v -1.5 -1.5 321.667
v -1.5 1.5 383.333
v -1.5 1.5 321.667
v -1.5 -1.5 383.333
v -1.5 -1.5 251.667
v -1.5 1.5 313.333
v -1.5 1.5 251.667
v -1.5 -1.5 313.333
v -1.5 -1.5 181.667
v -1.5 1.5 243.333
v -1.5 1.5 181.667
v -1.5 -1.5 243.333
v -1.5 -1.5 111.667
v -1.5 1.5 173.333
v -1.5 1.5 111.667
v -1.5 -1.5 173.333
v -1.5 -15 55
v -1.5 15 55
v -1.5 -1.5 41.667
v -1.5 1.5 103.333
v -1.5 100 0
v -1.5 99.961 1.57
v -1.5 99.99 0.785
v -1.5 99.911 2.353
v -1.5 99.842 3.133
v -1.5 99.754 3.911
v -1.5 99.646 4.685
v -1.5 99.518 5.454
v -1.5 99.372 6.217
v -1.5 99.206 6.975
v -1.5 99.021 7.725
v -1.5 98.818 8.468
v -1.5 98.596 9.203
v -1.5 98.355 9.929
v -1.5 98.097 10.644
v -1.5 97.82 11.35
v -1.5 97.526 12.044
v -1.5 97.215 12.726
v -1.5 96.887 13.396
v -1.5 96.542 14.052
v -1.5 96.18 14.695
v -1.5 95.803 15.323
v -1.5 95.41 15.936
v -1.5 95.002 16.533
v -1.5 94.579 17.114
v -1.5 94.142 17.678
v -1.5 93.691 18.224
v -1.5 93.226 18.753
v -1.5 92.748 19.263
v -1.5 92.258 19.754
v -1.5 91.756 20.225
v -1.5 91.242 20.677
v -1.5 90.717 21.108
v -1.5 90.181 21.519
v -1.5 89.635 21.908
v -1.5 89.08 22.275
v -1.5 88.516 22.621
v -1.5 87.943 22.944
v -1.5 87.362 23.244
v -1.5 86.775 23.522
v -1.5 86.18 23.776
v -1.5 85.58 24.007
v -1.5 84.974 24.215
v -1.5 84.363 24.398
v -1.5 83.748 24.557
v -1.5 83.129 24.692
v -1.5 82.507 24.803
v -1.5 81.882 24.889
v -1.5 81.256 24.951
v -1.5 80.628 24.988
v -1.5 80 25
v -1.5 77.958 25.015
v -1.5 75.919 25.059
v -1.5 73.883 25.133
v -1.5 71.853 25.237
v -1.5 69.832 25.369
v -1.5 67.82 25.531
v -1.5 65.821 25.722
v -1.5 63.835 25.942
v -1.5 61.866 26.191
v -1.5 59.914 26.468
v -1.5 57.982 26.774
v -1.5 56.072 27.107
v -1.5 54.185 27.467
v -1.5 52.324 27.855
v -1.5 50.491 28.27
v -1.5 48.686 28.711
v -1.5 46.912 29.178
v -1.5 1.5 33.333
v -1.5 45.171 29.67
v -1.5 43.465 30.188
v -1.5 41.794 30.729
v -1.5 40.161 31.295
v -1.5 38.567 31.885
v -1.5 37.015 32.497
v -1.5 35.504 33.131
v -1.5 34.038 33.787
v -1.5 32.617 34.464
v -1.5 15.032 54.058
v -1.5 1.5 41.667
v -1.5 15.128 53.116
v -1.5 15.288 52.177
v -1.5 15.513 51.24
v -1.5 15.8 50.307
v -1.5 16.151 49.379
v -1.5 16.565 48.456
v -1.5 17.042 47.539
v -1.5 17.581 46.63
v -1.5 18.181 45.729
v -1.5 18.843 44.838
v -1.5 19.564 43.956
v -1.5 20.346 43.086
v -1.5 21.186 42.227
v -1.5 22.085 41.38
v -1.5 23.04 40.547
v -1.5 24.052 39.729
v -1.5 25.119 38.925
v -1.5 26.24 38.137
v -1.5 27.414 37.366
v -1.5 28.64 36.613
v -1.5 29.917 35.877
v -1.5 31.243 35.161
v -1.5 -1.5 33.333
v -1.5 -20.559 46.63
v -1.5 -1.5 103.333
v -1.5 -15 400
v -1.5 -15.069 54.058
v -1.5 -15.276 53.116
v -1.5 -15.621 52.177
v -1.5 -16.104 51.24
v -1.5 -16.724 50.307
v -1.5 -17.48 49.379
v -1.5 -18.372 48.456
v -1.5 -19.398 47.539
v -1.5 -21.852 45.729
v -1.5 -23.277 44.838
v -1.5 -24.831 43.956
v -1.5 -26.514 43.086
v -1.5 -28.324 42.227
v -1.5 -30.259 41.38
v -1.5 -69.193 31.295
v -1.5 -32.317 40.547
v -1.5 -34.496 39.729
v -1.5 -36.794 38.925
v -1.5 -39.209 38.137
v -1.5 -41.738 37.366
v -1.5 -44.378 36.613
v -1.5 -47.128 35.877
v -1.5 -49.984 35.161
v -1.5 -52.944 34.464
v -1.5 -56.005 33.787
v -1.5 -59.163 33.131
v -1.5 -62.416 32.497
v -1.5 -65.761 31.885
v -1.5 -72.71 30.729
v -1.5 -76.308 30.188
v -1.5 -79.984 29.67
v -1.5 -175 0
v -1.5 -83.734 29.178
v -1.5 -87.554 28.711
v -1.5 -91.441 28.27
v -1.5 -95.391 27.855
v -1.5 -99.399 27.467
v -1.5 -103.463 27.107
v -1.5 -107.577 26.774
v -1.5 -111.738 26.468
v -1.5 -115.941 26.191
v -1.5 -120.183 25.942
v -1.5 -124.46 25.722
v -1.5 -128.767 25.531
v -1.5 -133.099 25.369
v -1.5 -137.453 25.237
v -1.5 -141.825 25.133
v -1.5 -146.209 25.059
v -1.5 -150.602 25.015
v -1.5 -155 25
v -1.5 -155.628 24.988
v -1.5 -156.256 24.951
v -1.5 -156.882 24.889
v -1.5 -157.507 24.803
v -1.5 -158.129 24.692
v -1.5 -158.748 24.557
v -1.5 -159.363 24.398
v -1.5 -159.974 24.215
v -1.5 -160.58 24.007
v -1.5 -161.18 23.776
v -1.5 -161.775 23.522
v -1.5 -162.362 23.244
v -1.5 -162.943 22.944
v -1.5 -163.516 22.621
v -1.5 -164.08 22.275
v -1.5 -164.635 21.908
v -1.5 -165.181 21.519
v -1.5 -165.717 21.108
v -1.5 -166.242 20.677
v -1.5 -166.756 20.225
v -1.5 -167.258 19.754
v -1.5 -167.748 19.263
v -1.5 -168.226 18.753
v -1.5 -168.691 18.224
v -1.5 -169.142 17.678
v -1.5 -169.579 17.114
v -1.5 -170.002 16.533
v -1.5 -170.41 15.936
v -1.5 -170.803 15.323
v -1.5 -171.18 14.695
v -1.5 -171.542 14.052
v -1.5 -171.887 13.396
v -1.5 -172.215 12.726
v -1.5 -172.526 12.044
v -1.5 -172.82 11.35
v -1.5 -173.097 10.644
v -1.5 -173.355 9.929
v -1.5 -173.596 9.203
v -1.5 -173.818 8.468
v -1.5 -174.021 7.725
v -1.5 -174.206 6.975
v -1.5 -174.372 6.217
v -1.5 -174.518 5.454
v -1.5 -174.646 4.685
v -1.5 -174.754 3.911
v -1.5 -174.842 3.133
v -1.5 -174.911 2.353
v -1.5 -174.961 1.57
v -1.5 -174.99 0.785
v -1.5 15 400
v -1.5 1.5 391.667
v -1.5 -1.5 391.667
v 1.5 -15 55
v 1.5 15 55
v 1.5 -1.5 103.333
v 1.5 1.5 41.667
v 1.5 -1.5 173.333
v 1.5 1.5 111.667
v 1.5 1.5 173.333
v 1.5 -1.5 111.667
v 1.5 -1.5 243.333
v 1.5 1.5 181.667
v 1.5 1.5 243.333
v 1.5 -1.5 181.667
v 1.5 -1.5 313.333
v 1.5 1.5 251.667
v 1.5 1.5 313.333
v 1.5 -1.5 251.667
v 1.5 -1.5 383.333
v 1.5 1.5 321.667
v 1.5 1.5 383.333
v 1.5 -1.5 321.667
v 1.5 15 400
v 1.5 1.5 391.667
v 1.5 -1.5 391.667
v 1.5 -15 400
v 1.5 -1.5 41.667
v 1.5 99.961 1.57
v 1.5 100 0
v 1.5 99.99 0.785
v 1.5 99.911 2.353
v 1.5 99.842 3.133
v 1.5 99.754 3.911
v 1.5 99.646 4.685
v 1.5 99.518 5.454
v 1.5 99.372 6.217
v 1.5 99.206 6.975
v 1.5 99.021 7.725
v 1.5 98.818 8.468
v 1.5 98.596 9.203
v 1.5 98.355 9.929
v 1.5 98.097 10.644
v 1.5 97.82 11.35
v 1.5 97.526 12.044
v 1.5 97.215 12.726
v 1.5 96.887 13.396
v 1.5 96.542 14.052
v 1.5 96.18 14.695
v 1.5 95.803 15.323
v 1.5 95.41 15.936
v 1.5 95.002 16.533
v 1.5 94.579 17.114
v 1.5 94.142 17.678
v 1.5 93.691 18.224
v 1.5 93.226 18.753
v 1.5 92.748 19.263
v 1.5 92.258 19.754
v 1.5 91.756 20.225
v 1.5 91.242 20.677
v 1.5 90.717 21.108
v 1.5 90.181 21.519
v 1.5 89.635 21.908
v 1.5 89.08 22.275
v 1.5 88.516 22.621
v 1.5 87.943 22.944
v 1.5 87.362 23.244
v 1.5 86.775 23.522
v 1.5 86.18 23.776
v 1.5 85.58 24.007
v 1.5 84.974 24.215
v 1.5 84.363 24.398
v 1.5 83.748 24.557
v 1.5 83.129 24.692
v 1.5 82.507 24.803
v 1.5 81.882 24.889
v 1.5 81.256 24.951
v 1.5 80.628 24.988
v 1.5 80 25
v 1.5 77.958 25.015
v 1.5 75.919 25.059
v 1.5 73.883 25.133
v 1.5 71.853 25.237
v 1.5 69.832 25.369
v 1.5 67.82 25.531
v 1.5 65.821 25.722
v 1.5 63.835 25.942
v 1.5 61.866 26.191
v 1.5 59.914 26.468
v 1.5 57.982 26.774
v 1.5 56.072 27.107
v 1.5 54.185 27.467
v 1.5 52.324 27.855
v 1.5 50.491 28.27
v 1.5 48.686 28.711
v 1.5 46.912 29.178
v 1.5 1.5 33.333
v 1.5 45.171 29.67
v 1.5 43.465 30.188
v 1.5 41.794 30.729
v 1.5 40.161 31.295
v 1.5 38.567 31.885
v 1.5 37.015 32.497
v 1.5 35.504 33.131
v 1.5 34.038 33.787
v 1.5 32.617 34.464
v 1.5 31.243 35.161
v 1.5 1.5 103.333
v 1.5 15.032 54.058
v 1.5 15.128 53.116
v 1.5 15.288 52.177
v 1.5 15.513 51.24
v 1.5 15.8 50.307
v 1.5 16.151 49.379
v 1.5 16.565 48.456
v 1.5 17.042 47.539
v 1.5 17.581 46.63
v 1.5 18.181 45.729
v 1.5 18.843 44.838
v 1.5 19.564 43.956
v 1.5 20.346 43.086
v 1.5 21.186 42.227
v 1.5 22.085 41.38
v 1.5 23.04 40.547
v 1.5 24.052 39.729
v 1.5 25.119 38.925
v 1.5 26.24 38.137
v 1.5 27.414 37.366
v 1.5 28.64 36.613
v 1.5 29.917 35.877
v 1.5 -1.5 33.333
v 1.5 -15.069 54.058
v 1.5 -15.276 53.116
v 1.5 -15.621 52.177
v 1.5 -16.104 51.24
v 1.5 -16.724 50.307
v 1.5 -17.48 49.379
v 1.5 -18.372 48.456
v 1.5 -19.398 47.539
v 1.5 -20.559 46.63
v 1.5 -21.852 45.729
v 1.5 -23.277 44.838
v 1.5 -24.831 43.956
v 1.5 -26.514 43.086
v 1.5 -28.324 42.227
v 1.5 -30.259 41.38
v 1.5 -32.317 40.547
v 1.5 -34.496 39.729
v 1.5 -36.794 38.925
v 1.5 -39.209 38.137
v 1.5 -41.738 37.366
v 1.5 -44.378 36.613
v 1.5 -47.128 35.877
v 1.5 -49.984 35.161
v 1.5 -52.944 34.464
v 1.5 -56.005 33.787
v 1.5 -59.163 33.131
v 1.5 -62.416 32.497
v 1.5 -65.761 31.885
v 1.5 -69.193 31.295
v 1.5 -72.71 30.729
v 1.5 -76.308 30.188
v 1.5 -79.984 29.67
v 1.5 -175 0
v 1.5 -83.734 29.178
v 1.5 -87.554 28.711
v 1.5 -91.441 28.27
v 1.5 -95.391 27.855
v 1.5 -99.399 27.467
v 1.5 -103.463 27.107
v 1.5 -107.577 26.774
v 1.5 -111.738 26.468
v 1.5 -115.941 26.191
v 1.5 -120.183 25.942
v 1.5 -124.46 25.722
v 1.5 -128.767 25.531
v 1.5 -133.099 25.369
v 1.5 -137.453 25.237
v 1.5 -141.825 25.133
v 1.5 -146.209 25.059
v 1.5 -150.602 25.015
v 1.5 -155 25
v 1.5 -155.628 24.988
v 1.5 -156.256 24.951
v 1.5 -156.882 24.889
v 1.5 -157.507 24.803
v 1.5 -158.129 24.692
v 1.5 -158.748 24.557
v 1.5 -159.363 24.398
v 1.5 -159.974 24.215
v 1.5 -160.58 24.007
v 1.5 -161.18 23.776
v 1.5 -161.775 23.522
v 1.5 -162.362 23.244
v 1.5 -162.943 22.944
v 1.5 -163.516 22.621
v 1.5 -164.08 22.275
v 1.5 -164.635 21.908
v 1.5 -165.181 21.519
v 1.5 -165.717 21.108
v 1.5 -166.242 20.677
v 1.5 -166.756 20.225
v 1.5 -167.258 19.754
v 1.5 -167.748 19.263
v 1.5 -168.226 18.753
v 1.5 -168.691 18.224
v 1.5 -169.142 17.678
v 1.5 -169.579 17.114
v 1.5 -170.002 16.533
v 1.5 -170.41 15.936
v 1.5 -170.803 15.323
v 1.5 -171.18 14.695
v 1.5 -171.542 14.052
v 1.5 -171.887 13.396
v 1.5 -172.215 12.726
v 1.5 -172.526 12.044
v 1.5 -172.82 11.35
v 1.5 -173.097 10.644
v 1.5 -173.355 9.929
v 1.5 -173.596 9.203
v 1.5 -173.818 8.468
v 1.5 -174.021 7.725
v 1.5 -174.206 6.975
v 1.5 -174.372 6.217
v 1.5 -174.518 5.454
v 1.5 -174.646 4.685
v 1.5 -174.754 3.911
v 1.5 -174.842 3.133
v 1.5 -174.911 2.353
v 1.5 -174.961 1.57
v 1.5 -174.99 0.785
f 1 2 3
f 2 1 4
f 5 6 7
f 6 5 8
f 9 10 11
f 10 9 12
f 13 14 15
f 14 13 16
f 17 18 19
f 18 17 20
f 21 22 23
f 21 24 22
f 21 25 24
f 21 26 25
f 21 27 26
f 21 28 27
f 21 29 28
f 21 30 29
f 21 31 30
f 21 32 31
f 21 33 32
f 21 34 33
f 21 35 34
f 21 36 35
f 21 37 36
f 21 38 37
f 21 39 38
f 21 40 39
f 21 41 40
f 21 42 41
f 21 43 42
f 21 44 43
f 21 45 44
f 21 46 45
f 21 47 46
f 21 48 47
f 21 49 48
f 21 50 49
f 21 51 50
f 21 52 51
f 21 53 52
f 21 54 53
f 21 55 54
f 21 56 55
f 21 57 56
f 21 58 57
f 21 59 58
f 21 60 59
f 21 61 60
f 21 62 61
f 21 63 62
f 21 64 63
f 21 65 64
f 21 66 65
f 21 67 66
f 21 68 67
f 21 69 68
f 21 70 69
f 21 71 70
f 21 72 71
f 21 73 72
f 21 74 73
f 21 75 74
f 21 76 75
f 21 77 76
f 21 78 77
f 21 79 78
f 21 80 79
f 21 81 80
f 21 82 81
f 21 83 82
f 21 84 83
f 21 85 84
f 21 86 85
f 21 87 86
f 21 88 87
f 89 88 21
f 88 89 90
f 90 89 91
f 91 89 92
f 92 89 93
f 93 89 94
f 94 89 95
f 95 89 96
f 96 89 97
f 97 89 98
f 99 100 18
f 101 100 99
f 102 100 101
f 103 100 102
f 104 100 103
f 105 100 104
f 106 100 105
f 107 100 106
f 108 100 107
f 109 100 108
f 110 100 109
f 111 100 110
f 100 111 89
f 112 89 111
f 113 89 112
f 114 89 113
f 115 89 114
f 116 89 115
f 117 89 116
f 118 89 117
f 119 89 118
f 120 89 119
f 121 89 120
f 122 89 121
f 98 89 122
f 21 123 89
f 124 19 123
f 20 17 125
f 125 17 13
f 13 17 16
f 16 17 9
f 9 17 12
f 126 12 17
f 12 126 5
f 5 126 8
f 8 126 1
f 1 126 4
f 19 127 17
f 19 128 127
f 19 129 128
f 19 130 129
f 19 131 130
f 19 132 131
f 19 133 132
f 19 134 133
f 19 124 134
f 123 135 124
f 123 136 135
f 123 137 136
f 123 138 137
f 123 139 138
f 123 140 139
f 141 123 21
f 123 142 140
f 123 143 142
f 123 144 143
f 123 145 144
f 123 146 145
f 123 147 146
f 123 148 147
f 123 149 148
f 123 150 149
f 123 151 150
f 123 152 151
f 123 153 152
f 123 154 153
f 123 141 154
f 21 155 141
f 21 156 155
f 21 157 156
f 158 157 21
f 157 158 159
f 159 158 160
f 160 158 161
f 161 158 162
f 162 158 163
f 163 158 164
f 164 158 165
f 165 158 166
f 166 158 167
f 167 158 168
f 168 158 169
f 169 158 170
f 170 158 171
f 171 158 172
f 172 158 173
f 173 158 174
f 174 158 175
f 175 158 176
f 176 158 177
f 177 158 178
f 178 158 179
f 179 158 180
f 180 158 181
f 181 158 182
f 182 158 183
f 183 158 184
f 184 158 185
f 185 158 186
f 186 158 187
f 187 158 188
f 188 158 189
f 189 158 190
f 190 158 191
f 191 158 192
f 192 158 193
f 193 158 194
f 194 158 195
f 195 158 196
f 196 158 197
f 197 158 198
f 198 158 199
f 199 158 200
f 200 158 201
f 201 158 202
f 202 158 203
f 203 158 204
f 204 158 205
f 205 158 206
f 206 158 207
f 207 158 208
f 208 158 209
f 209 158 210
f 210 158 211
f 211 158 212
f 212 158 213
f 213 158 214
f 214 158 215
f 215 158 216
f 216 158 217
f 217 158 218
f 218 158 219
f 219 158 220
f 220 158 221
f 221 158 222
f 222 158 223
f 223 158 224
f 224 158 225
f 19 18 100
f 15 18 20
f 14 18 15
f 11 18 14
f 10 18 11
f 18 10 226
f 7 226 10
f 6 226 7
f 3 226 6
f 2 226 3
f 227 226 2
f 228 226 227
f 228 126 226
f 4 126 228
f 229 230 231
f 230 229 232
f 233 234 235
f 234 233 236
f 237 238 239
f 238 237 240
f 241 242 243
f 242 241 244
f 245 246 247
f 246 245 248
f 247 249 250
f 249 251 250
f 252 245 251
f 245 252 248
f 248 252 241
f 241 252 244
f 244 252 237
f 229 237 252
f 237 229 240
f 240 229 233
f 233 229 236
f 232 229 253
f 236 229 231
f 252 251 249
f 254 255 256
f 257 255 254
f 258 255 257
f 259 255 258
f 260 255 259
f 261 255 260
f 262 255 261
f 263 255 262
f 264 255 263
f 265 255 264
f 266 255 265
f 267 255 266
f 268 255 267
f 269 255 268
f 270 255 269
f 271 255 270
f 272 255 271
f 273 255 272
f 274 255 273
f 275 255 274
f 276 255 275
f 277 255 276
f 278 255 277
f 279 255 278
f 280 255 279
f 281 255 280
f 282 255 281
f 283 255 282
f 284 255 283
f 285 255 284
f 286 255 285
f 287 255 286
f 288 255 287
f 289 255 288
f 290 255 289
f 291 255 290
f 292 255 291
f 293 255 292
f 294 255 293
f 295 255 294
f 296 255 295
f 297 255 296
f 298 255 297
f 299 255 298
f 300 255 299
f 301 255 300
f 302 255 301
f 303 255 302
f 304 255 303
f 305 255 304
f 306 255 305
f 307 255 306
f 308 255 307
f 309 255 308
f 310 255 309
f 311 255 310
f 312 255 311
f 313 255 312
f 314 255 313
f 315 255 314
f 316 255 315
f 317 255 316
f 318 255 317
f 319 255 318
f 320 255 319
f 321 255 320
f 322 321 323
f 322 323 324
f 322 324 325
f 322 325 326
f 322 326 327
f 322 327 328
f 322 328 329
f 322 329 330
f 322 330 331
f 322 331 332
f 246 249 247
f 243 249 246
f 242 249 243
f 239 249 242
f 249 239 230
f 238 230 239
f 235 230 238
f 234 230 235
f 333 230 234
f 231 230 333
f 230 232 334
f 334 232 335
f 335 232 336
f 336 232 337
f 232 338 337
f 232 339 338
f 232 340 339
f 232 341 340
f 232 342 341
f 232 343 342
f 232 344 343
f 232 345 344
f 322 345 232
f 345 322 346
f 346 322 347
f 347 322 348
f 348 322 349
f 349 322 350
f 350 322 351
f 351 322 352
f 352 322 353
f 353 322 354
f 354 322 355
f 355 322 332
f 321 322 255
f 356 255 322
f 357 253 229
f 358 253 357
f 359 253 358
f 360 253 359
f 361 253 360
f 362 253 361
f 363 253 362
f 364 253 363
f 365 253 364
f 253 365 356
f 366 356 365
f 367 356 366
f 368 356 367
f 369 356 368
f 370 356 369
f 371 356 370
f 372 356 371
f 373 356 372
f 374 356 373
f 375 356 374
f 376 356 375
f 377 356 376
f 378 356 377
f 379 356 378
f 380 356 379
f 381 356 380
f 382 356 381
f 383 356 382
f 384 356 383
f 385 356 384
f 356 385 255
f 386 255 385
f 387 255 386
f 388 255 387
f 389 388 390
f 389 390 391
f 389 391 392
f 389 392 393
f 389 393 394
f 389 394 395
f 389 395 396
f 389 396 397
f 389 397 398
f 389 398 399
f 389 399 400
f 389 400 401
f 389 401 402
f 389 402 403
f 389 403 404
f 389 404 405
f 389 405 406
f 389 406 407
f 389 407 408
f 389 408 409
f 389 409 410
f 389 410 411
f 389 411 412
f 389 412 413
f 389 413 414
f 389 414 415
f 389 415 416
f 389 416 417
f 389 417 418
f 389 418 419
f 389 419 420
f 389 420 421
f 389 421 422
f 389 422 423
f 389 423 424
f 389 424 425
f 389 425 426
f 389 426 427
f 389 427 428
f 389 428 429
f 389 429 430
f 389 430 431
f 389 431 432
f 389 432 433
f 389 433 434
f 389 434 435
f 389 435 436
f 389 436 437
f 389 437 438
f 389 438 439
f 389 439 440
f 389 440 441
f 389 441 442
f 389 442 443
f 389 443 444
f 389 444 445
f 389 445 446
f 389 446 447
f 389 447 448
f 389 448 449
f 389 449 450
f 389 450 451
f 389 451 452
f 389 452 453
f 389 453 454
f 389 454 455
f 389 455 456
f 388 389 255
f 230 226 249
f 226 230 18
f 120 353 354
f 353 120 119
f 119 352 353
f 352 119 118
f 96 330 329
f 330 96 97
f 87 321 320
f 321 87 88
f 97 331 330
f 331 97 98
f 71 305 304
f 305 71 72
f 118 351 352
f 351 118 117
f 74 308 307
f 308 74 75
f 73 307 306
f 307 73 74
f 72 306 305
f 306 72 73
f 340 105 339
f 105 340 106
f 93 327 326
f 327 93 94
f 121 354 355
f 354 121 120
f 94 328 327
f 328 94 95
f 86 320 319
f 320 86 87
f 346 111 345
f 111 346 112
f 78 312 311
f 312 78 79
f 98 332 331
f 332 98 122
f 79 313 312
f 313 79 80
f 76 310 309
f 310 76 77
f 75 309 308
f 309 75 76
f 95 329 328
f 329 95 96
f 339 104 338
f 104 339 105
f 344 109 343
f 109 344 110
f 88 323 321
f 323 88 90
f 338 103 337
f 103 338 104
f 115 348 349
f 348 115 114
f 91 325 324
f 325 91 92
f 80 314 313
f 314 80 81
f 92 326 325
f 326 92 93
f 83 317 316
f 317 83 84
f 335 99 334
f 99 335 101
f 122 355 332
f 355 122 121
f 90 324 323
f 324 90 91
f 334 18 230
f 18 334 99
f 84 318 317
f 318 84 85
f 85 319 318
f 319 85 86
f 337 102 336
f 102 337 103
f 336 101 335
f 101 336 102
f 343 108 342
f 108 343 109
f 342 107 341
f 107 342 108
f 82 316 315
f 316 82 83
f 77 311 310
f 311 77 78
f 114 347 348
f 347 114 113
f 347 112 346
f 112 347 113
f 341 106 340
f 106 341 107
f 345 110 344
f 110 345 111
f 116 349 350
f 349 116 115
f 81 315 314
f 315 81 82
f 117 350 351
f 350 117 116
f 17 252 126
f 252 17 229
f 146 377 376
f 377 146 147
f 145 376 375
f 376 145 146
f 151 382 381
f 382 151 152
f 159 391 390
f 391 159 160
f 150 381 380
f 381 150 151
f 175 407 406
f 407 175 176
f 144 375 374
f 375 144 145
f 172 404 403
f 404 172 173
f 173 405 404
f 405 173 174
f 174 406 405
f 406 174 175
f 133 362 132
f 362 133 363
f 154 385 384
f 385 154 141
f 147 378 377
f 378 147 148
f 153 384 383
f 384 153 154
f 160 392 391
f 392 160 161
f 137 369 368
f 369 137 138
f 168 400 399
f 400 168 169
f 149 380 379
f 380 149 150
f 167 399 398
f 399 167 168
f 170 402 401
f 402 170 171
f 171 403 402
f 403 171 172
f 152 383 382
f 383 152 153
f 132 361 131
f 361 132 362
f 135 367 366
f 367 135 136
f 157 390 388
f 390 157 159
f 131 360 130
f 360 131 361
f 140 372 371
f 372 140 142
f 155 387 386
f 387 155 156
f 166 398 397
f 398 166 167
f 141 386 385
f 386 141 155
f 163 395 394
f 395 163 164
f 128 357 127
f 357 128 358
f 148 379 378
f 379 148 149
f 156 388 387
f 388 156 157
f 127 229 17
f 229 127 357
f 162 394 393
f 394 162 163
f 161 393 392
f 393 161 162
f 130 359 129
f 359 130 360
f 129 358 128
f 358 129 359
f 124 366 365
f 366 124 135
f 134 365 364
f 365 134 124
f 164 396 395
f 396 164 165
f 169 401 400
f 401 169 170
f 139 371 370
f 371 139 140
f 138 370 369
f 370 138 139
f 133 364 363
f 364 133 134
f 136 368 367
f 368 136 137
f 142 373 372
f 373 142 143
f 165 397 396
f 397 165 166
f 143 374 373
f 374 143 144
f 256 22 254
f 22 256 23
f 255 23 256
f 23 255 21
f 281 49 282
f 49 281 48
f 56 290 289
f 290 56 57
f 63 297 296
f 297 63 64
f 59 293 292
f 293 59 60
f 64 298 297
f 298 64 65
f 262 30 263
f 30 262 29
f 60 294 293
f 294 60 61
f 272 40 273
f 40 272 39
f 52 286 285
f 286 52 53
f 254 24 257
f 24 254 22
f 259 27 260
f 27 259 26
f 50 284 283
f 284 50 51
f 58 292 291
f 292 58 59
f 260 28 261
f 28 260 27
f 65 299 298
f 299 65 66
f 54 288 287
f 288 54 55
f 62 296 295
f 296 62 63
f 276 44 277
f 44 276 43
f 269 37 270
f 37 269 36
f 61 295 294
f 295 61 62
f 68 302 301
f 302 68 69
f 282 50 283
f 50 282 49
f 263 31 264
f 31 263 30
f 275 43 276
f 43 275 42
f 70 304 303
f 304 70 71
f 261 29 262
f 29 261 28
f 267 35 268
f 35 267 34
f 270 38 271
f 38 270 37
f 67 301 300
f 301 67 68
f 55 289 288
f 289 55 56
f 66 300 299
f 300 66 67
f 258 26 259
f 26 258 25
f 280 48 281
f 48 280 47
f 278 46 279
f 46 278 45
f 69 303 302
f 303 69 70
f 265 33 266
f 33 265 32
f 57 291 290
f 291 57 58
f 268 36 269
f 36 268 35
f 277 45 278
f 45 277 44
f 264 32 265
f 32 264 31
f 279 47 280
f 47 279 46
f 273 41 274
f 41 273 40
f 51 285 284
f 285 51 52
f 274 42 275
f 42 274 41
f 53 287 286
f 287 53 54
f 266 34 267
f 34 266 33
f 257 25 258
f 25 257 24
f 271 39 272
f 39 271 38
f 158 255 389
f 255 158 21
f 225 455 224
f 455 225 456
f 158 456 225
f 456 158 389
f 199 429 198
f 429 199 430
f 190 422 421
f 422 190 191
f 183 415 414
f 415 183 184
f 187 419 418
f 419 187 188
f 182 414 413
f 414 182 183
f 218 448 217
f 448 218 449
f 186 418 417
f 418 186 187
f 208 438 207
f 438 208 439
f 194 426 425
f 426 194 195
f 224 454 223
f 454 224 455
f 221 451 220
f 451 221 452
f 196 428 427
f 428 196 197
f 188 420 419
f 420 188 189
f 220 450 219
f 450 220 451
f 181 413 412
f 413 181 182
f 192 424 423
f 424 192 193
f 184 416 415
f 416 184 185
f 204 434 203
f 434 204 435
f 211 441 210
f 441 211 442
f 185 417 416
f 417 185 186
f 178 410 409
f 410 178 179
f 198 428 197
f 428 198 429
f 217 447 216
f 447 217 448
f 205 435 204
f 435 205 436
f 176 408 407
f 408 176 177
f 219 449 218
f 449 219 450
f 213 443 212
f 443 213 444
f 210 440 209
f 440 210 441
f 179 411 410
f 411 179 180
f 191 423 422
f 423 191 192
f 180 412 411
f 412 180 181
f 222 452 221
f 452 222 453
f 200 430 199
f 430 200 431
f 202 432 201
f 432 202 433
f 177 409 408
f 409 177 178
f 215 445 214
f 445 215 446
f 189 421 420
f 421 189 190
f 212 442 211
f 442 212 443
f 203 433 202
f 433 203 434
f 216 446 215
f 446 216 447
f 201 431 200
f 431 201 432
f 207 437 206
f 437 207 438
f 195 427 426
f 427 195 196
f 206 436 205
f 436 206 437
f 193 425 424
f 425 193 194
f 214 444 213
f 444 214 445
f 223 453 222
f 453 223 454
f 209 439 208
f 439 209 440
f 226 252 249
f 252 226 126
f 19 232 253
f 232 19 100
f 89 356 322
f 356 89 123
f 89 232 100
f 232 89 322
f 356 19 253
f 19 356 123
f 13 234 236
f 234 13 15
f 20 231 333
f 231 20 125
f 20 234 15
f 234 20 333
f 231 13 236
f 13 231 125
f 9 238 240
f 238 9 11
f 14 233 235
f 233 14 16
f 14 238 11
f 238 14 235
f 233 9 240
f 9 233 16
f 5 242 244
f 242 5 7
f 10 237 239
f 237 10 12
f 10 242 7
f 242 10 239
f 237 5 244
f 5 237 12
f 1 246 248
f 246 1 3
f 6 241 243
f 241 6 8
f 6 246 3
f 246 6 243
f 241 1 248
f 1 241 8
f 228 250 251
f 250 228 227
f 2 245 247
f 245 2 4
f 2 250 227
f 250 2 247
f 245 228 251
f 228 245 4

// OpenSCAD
// file: ../corners.scad
$fn = 200;
nothing = 0.05;

/**
 * @brief Draws a round corner in the XY plane.
 */
module round_corner_outside(x=1, y=1, z=1)
{
    scale([x, y, 1])
    translate([0, 0, -z/2])
    intersection()
    {
        // full circle
        linear_extrude(z)
        circle(1);

        // x >= 0; y >= 0;
        cube([x, y, z]);
    }
}

/**
 * @brief Draws a round corner in the XY plane.
 */
module round_corner_inside(x=1, y=1, z=1)
{
    scale([x, y, z])
    translate([0, 0, -1/2])
    difference()
    {
        // x >= 0; y >= 0;
        cube([1, 1, 1]);

        translate([1, 1, -nothing/2])
        linear_extrude(1 + nothing)
        circle(1);
    }
}

rotate(180)
round_corner_outside(10, 8);

round_corner_inside(10, 8);
// file: ../config.scad
// all measures in millimeters

// rendering quality
$fn = 200;
nothing = 0.05;

// material to cut from
material_z = 3;

// wall configuration: bounding box measures
wall_x = 550;
wall_y = 30;
wall_z = 400;

// length of the foot towards the front and back of the wall (asymmetrical)
foot_y_back = 100;
foot_y_front = 175;

// foot height
foot_z = 25;

// rounded corners at front and back of the foot
foot_round_y = 20;

// number of support beams
support_count = 6;

// height of a support beam
support_z = 25;

// pot configuration: outer measures of the top opening
pot_x = 70;
pot_y = 70;
pot_z = 50;

// pots have hooks to hang at the wall supports
hook_width = 10;
// main file
include <../config.scad>;
use <../corners.scad>;

module wall_vertical_without_holes()
{
    // horizontal
    translate([0, 0, wall_z/2])
    cube([
        material_z,
        wall_y,
        wall_z
        ], center=true);

    // foot
    translate([0, -(foot_y_front - foot_round_y)/2, +foot_z/2])
    cube([
        material_z,
        foot_y_front - foot_round_y,
        foot_z
        ], center=true);

    translate([0, (foot_y_back - foot_round_y)/2, +foot_z/2])
    cube([
        material_z,
        foot_y_back - foot_round_y,
        foot_z
        ], center=true);

    // round corners on top of the foot
    translate([0, wall_y/2, foot_z])
    rotate([0, -90, 0])
    round_corner_inside(
        wall_y,
        foot_y_back - wall_y/2 - foot_round_y,
        material_z
        );

    translate([0, -wall_y/2, foot_z])
    rotate([0, -90, 180])
    round_corner_inside(
        wall_y,
        foot_y_front - wall_y/2 - foot_round_y,
        material_z
        );

    // round corners on the sides of the foot
    translate([0, foot_y_back - foot_round_y, 0])
    rotate([90, 0, 90])
    round_corner_outside(
        foot_round_y,
        foot_z,
        material_z
        );

    translate([0, - foot_y_front + foot_round_y, 0])
    rotate([90, 0, -90])
    round_corner_outside(
        foot_round_y,
        foot_z,
        material_z
        );
}

module wall_vertical()
{
    difference()
    {
        wall_vertical_without_holes();

        // nose cutouts for horizontal beams
        usable_z = wall_z - pot_z;
        delta_z = usable_z / (support_count-1);
        offset_z = pot_z - support_z/2;
        color("brown")
        for (i=[1:support_count])
        {
            translate([
                0,
                0,
                offset_z + (i-1) * delta_z
                ])
            cube(
                [
                material_z*2,
                material_z,
                support_z/3
                ], center=true);
        }
    }
}

wall_vertical();
